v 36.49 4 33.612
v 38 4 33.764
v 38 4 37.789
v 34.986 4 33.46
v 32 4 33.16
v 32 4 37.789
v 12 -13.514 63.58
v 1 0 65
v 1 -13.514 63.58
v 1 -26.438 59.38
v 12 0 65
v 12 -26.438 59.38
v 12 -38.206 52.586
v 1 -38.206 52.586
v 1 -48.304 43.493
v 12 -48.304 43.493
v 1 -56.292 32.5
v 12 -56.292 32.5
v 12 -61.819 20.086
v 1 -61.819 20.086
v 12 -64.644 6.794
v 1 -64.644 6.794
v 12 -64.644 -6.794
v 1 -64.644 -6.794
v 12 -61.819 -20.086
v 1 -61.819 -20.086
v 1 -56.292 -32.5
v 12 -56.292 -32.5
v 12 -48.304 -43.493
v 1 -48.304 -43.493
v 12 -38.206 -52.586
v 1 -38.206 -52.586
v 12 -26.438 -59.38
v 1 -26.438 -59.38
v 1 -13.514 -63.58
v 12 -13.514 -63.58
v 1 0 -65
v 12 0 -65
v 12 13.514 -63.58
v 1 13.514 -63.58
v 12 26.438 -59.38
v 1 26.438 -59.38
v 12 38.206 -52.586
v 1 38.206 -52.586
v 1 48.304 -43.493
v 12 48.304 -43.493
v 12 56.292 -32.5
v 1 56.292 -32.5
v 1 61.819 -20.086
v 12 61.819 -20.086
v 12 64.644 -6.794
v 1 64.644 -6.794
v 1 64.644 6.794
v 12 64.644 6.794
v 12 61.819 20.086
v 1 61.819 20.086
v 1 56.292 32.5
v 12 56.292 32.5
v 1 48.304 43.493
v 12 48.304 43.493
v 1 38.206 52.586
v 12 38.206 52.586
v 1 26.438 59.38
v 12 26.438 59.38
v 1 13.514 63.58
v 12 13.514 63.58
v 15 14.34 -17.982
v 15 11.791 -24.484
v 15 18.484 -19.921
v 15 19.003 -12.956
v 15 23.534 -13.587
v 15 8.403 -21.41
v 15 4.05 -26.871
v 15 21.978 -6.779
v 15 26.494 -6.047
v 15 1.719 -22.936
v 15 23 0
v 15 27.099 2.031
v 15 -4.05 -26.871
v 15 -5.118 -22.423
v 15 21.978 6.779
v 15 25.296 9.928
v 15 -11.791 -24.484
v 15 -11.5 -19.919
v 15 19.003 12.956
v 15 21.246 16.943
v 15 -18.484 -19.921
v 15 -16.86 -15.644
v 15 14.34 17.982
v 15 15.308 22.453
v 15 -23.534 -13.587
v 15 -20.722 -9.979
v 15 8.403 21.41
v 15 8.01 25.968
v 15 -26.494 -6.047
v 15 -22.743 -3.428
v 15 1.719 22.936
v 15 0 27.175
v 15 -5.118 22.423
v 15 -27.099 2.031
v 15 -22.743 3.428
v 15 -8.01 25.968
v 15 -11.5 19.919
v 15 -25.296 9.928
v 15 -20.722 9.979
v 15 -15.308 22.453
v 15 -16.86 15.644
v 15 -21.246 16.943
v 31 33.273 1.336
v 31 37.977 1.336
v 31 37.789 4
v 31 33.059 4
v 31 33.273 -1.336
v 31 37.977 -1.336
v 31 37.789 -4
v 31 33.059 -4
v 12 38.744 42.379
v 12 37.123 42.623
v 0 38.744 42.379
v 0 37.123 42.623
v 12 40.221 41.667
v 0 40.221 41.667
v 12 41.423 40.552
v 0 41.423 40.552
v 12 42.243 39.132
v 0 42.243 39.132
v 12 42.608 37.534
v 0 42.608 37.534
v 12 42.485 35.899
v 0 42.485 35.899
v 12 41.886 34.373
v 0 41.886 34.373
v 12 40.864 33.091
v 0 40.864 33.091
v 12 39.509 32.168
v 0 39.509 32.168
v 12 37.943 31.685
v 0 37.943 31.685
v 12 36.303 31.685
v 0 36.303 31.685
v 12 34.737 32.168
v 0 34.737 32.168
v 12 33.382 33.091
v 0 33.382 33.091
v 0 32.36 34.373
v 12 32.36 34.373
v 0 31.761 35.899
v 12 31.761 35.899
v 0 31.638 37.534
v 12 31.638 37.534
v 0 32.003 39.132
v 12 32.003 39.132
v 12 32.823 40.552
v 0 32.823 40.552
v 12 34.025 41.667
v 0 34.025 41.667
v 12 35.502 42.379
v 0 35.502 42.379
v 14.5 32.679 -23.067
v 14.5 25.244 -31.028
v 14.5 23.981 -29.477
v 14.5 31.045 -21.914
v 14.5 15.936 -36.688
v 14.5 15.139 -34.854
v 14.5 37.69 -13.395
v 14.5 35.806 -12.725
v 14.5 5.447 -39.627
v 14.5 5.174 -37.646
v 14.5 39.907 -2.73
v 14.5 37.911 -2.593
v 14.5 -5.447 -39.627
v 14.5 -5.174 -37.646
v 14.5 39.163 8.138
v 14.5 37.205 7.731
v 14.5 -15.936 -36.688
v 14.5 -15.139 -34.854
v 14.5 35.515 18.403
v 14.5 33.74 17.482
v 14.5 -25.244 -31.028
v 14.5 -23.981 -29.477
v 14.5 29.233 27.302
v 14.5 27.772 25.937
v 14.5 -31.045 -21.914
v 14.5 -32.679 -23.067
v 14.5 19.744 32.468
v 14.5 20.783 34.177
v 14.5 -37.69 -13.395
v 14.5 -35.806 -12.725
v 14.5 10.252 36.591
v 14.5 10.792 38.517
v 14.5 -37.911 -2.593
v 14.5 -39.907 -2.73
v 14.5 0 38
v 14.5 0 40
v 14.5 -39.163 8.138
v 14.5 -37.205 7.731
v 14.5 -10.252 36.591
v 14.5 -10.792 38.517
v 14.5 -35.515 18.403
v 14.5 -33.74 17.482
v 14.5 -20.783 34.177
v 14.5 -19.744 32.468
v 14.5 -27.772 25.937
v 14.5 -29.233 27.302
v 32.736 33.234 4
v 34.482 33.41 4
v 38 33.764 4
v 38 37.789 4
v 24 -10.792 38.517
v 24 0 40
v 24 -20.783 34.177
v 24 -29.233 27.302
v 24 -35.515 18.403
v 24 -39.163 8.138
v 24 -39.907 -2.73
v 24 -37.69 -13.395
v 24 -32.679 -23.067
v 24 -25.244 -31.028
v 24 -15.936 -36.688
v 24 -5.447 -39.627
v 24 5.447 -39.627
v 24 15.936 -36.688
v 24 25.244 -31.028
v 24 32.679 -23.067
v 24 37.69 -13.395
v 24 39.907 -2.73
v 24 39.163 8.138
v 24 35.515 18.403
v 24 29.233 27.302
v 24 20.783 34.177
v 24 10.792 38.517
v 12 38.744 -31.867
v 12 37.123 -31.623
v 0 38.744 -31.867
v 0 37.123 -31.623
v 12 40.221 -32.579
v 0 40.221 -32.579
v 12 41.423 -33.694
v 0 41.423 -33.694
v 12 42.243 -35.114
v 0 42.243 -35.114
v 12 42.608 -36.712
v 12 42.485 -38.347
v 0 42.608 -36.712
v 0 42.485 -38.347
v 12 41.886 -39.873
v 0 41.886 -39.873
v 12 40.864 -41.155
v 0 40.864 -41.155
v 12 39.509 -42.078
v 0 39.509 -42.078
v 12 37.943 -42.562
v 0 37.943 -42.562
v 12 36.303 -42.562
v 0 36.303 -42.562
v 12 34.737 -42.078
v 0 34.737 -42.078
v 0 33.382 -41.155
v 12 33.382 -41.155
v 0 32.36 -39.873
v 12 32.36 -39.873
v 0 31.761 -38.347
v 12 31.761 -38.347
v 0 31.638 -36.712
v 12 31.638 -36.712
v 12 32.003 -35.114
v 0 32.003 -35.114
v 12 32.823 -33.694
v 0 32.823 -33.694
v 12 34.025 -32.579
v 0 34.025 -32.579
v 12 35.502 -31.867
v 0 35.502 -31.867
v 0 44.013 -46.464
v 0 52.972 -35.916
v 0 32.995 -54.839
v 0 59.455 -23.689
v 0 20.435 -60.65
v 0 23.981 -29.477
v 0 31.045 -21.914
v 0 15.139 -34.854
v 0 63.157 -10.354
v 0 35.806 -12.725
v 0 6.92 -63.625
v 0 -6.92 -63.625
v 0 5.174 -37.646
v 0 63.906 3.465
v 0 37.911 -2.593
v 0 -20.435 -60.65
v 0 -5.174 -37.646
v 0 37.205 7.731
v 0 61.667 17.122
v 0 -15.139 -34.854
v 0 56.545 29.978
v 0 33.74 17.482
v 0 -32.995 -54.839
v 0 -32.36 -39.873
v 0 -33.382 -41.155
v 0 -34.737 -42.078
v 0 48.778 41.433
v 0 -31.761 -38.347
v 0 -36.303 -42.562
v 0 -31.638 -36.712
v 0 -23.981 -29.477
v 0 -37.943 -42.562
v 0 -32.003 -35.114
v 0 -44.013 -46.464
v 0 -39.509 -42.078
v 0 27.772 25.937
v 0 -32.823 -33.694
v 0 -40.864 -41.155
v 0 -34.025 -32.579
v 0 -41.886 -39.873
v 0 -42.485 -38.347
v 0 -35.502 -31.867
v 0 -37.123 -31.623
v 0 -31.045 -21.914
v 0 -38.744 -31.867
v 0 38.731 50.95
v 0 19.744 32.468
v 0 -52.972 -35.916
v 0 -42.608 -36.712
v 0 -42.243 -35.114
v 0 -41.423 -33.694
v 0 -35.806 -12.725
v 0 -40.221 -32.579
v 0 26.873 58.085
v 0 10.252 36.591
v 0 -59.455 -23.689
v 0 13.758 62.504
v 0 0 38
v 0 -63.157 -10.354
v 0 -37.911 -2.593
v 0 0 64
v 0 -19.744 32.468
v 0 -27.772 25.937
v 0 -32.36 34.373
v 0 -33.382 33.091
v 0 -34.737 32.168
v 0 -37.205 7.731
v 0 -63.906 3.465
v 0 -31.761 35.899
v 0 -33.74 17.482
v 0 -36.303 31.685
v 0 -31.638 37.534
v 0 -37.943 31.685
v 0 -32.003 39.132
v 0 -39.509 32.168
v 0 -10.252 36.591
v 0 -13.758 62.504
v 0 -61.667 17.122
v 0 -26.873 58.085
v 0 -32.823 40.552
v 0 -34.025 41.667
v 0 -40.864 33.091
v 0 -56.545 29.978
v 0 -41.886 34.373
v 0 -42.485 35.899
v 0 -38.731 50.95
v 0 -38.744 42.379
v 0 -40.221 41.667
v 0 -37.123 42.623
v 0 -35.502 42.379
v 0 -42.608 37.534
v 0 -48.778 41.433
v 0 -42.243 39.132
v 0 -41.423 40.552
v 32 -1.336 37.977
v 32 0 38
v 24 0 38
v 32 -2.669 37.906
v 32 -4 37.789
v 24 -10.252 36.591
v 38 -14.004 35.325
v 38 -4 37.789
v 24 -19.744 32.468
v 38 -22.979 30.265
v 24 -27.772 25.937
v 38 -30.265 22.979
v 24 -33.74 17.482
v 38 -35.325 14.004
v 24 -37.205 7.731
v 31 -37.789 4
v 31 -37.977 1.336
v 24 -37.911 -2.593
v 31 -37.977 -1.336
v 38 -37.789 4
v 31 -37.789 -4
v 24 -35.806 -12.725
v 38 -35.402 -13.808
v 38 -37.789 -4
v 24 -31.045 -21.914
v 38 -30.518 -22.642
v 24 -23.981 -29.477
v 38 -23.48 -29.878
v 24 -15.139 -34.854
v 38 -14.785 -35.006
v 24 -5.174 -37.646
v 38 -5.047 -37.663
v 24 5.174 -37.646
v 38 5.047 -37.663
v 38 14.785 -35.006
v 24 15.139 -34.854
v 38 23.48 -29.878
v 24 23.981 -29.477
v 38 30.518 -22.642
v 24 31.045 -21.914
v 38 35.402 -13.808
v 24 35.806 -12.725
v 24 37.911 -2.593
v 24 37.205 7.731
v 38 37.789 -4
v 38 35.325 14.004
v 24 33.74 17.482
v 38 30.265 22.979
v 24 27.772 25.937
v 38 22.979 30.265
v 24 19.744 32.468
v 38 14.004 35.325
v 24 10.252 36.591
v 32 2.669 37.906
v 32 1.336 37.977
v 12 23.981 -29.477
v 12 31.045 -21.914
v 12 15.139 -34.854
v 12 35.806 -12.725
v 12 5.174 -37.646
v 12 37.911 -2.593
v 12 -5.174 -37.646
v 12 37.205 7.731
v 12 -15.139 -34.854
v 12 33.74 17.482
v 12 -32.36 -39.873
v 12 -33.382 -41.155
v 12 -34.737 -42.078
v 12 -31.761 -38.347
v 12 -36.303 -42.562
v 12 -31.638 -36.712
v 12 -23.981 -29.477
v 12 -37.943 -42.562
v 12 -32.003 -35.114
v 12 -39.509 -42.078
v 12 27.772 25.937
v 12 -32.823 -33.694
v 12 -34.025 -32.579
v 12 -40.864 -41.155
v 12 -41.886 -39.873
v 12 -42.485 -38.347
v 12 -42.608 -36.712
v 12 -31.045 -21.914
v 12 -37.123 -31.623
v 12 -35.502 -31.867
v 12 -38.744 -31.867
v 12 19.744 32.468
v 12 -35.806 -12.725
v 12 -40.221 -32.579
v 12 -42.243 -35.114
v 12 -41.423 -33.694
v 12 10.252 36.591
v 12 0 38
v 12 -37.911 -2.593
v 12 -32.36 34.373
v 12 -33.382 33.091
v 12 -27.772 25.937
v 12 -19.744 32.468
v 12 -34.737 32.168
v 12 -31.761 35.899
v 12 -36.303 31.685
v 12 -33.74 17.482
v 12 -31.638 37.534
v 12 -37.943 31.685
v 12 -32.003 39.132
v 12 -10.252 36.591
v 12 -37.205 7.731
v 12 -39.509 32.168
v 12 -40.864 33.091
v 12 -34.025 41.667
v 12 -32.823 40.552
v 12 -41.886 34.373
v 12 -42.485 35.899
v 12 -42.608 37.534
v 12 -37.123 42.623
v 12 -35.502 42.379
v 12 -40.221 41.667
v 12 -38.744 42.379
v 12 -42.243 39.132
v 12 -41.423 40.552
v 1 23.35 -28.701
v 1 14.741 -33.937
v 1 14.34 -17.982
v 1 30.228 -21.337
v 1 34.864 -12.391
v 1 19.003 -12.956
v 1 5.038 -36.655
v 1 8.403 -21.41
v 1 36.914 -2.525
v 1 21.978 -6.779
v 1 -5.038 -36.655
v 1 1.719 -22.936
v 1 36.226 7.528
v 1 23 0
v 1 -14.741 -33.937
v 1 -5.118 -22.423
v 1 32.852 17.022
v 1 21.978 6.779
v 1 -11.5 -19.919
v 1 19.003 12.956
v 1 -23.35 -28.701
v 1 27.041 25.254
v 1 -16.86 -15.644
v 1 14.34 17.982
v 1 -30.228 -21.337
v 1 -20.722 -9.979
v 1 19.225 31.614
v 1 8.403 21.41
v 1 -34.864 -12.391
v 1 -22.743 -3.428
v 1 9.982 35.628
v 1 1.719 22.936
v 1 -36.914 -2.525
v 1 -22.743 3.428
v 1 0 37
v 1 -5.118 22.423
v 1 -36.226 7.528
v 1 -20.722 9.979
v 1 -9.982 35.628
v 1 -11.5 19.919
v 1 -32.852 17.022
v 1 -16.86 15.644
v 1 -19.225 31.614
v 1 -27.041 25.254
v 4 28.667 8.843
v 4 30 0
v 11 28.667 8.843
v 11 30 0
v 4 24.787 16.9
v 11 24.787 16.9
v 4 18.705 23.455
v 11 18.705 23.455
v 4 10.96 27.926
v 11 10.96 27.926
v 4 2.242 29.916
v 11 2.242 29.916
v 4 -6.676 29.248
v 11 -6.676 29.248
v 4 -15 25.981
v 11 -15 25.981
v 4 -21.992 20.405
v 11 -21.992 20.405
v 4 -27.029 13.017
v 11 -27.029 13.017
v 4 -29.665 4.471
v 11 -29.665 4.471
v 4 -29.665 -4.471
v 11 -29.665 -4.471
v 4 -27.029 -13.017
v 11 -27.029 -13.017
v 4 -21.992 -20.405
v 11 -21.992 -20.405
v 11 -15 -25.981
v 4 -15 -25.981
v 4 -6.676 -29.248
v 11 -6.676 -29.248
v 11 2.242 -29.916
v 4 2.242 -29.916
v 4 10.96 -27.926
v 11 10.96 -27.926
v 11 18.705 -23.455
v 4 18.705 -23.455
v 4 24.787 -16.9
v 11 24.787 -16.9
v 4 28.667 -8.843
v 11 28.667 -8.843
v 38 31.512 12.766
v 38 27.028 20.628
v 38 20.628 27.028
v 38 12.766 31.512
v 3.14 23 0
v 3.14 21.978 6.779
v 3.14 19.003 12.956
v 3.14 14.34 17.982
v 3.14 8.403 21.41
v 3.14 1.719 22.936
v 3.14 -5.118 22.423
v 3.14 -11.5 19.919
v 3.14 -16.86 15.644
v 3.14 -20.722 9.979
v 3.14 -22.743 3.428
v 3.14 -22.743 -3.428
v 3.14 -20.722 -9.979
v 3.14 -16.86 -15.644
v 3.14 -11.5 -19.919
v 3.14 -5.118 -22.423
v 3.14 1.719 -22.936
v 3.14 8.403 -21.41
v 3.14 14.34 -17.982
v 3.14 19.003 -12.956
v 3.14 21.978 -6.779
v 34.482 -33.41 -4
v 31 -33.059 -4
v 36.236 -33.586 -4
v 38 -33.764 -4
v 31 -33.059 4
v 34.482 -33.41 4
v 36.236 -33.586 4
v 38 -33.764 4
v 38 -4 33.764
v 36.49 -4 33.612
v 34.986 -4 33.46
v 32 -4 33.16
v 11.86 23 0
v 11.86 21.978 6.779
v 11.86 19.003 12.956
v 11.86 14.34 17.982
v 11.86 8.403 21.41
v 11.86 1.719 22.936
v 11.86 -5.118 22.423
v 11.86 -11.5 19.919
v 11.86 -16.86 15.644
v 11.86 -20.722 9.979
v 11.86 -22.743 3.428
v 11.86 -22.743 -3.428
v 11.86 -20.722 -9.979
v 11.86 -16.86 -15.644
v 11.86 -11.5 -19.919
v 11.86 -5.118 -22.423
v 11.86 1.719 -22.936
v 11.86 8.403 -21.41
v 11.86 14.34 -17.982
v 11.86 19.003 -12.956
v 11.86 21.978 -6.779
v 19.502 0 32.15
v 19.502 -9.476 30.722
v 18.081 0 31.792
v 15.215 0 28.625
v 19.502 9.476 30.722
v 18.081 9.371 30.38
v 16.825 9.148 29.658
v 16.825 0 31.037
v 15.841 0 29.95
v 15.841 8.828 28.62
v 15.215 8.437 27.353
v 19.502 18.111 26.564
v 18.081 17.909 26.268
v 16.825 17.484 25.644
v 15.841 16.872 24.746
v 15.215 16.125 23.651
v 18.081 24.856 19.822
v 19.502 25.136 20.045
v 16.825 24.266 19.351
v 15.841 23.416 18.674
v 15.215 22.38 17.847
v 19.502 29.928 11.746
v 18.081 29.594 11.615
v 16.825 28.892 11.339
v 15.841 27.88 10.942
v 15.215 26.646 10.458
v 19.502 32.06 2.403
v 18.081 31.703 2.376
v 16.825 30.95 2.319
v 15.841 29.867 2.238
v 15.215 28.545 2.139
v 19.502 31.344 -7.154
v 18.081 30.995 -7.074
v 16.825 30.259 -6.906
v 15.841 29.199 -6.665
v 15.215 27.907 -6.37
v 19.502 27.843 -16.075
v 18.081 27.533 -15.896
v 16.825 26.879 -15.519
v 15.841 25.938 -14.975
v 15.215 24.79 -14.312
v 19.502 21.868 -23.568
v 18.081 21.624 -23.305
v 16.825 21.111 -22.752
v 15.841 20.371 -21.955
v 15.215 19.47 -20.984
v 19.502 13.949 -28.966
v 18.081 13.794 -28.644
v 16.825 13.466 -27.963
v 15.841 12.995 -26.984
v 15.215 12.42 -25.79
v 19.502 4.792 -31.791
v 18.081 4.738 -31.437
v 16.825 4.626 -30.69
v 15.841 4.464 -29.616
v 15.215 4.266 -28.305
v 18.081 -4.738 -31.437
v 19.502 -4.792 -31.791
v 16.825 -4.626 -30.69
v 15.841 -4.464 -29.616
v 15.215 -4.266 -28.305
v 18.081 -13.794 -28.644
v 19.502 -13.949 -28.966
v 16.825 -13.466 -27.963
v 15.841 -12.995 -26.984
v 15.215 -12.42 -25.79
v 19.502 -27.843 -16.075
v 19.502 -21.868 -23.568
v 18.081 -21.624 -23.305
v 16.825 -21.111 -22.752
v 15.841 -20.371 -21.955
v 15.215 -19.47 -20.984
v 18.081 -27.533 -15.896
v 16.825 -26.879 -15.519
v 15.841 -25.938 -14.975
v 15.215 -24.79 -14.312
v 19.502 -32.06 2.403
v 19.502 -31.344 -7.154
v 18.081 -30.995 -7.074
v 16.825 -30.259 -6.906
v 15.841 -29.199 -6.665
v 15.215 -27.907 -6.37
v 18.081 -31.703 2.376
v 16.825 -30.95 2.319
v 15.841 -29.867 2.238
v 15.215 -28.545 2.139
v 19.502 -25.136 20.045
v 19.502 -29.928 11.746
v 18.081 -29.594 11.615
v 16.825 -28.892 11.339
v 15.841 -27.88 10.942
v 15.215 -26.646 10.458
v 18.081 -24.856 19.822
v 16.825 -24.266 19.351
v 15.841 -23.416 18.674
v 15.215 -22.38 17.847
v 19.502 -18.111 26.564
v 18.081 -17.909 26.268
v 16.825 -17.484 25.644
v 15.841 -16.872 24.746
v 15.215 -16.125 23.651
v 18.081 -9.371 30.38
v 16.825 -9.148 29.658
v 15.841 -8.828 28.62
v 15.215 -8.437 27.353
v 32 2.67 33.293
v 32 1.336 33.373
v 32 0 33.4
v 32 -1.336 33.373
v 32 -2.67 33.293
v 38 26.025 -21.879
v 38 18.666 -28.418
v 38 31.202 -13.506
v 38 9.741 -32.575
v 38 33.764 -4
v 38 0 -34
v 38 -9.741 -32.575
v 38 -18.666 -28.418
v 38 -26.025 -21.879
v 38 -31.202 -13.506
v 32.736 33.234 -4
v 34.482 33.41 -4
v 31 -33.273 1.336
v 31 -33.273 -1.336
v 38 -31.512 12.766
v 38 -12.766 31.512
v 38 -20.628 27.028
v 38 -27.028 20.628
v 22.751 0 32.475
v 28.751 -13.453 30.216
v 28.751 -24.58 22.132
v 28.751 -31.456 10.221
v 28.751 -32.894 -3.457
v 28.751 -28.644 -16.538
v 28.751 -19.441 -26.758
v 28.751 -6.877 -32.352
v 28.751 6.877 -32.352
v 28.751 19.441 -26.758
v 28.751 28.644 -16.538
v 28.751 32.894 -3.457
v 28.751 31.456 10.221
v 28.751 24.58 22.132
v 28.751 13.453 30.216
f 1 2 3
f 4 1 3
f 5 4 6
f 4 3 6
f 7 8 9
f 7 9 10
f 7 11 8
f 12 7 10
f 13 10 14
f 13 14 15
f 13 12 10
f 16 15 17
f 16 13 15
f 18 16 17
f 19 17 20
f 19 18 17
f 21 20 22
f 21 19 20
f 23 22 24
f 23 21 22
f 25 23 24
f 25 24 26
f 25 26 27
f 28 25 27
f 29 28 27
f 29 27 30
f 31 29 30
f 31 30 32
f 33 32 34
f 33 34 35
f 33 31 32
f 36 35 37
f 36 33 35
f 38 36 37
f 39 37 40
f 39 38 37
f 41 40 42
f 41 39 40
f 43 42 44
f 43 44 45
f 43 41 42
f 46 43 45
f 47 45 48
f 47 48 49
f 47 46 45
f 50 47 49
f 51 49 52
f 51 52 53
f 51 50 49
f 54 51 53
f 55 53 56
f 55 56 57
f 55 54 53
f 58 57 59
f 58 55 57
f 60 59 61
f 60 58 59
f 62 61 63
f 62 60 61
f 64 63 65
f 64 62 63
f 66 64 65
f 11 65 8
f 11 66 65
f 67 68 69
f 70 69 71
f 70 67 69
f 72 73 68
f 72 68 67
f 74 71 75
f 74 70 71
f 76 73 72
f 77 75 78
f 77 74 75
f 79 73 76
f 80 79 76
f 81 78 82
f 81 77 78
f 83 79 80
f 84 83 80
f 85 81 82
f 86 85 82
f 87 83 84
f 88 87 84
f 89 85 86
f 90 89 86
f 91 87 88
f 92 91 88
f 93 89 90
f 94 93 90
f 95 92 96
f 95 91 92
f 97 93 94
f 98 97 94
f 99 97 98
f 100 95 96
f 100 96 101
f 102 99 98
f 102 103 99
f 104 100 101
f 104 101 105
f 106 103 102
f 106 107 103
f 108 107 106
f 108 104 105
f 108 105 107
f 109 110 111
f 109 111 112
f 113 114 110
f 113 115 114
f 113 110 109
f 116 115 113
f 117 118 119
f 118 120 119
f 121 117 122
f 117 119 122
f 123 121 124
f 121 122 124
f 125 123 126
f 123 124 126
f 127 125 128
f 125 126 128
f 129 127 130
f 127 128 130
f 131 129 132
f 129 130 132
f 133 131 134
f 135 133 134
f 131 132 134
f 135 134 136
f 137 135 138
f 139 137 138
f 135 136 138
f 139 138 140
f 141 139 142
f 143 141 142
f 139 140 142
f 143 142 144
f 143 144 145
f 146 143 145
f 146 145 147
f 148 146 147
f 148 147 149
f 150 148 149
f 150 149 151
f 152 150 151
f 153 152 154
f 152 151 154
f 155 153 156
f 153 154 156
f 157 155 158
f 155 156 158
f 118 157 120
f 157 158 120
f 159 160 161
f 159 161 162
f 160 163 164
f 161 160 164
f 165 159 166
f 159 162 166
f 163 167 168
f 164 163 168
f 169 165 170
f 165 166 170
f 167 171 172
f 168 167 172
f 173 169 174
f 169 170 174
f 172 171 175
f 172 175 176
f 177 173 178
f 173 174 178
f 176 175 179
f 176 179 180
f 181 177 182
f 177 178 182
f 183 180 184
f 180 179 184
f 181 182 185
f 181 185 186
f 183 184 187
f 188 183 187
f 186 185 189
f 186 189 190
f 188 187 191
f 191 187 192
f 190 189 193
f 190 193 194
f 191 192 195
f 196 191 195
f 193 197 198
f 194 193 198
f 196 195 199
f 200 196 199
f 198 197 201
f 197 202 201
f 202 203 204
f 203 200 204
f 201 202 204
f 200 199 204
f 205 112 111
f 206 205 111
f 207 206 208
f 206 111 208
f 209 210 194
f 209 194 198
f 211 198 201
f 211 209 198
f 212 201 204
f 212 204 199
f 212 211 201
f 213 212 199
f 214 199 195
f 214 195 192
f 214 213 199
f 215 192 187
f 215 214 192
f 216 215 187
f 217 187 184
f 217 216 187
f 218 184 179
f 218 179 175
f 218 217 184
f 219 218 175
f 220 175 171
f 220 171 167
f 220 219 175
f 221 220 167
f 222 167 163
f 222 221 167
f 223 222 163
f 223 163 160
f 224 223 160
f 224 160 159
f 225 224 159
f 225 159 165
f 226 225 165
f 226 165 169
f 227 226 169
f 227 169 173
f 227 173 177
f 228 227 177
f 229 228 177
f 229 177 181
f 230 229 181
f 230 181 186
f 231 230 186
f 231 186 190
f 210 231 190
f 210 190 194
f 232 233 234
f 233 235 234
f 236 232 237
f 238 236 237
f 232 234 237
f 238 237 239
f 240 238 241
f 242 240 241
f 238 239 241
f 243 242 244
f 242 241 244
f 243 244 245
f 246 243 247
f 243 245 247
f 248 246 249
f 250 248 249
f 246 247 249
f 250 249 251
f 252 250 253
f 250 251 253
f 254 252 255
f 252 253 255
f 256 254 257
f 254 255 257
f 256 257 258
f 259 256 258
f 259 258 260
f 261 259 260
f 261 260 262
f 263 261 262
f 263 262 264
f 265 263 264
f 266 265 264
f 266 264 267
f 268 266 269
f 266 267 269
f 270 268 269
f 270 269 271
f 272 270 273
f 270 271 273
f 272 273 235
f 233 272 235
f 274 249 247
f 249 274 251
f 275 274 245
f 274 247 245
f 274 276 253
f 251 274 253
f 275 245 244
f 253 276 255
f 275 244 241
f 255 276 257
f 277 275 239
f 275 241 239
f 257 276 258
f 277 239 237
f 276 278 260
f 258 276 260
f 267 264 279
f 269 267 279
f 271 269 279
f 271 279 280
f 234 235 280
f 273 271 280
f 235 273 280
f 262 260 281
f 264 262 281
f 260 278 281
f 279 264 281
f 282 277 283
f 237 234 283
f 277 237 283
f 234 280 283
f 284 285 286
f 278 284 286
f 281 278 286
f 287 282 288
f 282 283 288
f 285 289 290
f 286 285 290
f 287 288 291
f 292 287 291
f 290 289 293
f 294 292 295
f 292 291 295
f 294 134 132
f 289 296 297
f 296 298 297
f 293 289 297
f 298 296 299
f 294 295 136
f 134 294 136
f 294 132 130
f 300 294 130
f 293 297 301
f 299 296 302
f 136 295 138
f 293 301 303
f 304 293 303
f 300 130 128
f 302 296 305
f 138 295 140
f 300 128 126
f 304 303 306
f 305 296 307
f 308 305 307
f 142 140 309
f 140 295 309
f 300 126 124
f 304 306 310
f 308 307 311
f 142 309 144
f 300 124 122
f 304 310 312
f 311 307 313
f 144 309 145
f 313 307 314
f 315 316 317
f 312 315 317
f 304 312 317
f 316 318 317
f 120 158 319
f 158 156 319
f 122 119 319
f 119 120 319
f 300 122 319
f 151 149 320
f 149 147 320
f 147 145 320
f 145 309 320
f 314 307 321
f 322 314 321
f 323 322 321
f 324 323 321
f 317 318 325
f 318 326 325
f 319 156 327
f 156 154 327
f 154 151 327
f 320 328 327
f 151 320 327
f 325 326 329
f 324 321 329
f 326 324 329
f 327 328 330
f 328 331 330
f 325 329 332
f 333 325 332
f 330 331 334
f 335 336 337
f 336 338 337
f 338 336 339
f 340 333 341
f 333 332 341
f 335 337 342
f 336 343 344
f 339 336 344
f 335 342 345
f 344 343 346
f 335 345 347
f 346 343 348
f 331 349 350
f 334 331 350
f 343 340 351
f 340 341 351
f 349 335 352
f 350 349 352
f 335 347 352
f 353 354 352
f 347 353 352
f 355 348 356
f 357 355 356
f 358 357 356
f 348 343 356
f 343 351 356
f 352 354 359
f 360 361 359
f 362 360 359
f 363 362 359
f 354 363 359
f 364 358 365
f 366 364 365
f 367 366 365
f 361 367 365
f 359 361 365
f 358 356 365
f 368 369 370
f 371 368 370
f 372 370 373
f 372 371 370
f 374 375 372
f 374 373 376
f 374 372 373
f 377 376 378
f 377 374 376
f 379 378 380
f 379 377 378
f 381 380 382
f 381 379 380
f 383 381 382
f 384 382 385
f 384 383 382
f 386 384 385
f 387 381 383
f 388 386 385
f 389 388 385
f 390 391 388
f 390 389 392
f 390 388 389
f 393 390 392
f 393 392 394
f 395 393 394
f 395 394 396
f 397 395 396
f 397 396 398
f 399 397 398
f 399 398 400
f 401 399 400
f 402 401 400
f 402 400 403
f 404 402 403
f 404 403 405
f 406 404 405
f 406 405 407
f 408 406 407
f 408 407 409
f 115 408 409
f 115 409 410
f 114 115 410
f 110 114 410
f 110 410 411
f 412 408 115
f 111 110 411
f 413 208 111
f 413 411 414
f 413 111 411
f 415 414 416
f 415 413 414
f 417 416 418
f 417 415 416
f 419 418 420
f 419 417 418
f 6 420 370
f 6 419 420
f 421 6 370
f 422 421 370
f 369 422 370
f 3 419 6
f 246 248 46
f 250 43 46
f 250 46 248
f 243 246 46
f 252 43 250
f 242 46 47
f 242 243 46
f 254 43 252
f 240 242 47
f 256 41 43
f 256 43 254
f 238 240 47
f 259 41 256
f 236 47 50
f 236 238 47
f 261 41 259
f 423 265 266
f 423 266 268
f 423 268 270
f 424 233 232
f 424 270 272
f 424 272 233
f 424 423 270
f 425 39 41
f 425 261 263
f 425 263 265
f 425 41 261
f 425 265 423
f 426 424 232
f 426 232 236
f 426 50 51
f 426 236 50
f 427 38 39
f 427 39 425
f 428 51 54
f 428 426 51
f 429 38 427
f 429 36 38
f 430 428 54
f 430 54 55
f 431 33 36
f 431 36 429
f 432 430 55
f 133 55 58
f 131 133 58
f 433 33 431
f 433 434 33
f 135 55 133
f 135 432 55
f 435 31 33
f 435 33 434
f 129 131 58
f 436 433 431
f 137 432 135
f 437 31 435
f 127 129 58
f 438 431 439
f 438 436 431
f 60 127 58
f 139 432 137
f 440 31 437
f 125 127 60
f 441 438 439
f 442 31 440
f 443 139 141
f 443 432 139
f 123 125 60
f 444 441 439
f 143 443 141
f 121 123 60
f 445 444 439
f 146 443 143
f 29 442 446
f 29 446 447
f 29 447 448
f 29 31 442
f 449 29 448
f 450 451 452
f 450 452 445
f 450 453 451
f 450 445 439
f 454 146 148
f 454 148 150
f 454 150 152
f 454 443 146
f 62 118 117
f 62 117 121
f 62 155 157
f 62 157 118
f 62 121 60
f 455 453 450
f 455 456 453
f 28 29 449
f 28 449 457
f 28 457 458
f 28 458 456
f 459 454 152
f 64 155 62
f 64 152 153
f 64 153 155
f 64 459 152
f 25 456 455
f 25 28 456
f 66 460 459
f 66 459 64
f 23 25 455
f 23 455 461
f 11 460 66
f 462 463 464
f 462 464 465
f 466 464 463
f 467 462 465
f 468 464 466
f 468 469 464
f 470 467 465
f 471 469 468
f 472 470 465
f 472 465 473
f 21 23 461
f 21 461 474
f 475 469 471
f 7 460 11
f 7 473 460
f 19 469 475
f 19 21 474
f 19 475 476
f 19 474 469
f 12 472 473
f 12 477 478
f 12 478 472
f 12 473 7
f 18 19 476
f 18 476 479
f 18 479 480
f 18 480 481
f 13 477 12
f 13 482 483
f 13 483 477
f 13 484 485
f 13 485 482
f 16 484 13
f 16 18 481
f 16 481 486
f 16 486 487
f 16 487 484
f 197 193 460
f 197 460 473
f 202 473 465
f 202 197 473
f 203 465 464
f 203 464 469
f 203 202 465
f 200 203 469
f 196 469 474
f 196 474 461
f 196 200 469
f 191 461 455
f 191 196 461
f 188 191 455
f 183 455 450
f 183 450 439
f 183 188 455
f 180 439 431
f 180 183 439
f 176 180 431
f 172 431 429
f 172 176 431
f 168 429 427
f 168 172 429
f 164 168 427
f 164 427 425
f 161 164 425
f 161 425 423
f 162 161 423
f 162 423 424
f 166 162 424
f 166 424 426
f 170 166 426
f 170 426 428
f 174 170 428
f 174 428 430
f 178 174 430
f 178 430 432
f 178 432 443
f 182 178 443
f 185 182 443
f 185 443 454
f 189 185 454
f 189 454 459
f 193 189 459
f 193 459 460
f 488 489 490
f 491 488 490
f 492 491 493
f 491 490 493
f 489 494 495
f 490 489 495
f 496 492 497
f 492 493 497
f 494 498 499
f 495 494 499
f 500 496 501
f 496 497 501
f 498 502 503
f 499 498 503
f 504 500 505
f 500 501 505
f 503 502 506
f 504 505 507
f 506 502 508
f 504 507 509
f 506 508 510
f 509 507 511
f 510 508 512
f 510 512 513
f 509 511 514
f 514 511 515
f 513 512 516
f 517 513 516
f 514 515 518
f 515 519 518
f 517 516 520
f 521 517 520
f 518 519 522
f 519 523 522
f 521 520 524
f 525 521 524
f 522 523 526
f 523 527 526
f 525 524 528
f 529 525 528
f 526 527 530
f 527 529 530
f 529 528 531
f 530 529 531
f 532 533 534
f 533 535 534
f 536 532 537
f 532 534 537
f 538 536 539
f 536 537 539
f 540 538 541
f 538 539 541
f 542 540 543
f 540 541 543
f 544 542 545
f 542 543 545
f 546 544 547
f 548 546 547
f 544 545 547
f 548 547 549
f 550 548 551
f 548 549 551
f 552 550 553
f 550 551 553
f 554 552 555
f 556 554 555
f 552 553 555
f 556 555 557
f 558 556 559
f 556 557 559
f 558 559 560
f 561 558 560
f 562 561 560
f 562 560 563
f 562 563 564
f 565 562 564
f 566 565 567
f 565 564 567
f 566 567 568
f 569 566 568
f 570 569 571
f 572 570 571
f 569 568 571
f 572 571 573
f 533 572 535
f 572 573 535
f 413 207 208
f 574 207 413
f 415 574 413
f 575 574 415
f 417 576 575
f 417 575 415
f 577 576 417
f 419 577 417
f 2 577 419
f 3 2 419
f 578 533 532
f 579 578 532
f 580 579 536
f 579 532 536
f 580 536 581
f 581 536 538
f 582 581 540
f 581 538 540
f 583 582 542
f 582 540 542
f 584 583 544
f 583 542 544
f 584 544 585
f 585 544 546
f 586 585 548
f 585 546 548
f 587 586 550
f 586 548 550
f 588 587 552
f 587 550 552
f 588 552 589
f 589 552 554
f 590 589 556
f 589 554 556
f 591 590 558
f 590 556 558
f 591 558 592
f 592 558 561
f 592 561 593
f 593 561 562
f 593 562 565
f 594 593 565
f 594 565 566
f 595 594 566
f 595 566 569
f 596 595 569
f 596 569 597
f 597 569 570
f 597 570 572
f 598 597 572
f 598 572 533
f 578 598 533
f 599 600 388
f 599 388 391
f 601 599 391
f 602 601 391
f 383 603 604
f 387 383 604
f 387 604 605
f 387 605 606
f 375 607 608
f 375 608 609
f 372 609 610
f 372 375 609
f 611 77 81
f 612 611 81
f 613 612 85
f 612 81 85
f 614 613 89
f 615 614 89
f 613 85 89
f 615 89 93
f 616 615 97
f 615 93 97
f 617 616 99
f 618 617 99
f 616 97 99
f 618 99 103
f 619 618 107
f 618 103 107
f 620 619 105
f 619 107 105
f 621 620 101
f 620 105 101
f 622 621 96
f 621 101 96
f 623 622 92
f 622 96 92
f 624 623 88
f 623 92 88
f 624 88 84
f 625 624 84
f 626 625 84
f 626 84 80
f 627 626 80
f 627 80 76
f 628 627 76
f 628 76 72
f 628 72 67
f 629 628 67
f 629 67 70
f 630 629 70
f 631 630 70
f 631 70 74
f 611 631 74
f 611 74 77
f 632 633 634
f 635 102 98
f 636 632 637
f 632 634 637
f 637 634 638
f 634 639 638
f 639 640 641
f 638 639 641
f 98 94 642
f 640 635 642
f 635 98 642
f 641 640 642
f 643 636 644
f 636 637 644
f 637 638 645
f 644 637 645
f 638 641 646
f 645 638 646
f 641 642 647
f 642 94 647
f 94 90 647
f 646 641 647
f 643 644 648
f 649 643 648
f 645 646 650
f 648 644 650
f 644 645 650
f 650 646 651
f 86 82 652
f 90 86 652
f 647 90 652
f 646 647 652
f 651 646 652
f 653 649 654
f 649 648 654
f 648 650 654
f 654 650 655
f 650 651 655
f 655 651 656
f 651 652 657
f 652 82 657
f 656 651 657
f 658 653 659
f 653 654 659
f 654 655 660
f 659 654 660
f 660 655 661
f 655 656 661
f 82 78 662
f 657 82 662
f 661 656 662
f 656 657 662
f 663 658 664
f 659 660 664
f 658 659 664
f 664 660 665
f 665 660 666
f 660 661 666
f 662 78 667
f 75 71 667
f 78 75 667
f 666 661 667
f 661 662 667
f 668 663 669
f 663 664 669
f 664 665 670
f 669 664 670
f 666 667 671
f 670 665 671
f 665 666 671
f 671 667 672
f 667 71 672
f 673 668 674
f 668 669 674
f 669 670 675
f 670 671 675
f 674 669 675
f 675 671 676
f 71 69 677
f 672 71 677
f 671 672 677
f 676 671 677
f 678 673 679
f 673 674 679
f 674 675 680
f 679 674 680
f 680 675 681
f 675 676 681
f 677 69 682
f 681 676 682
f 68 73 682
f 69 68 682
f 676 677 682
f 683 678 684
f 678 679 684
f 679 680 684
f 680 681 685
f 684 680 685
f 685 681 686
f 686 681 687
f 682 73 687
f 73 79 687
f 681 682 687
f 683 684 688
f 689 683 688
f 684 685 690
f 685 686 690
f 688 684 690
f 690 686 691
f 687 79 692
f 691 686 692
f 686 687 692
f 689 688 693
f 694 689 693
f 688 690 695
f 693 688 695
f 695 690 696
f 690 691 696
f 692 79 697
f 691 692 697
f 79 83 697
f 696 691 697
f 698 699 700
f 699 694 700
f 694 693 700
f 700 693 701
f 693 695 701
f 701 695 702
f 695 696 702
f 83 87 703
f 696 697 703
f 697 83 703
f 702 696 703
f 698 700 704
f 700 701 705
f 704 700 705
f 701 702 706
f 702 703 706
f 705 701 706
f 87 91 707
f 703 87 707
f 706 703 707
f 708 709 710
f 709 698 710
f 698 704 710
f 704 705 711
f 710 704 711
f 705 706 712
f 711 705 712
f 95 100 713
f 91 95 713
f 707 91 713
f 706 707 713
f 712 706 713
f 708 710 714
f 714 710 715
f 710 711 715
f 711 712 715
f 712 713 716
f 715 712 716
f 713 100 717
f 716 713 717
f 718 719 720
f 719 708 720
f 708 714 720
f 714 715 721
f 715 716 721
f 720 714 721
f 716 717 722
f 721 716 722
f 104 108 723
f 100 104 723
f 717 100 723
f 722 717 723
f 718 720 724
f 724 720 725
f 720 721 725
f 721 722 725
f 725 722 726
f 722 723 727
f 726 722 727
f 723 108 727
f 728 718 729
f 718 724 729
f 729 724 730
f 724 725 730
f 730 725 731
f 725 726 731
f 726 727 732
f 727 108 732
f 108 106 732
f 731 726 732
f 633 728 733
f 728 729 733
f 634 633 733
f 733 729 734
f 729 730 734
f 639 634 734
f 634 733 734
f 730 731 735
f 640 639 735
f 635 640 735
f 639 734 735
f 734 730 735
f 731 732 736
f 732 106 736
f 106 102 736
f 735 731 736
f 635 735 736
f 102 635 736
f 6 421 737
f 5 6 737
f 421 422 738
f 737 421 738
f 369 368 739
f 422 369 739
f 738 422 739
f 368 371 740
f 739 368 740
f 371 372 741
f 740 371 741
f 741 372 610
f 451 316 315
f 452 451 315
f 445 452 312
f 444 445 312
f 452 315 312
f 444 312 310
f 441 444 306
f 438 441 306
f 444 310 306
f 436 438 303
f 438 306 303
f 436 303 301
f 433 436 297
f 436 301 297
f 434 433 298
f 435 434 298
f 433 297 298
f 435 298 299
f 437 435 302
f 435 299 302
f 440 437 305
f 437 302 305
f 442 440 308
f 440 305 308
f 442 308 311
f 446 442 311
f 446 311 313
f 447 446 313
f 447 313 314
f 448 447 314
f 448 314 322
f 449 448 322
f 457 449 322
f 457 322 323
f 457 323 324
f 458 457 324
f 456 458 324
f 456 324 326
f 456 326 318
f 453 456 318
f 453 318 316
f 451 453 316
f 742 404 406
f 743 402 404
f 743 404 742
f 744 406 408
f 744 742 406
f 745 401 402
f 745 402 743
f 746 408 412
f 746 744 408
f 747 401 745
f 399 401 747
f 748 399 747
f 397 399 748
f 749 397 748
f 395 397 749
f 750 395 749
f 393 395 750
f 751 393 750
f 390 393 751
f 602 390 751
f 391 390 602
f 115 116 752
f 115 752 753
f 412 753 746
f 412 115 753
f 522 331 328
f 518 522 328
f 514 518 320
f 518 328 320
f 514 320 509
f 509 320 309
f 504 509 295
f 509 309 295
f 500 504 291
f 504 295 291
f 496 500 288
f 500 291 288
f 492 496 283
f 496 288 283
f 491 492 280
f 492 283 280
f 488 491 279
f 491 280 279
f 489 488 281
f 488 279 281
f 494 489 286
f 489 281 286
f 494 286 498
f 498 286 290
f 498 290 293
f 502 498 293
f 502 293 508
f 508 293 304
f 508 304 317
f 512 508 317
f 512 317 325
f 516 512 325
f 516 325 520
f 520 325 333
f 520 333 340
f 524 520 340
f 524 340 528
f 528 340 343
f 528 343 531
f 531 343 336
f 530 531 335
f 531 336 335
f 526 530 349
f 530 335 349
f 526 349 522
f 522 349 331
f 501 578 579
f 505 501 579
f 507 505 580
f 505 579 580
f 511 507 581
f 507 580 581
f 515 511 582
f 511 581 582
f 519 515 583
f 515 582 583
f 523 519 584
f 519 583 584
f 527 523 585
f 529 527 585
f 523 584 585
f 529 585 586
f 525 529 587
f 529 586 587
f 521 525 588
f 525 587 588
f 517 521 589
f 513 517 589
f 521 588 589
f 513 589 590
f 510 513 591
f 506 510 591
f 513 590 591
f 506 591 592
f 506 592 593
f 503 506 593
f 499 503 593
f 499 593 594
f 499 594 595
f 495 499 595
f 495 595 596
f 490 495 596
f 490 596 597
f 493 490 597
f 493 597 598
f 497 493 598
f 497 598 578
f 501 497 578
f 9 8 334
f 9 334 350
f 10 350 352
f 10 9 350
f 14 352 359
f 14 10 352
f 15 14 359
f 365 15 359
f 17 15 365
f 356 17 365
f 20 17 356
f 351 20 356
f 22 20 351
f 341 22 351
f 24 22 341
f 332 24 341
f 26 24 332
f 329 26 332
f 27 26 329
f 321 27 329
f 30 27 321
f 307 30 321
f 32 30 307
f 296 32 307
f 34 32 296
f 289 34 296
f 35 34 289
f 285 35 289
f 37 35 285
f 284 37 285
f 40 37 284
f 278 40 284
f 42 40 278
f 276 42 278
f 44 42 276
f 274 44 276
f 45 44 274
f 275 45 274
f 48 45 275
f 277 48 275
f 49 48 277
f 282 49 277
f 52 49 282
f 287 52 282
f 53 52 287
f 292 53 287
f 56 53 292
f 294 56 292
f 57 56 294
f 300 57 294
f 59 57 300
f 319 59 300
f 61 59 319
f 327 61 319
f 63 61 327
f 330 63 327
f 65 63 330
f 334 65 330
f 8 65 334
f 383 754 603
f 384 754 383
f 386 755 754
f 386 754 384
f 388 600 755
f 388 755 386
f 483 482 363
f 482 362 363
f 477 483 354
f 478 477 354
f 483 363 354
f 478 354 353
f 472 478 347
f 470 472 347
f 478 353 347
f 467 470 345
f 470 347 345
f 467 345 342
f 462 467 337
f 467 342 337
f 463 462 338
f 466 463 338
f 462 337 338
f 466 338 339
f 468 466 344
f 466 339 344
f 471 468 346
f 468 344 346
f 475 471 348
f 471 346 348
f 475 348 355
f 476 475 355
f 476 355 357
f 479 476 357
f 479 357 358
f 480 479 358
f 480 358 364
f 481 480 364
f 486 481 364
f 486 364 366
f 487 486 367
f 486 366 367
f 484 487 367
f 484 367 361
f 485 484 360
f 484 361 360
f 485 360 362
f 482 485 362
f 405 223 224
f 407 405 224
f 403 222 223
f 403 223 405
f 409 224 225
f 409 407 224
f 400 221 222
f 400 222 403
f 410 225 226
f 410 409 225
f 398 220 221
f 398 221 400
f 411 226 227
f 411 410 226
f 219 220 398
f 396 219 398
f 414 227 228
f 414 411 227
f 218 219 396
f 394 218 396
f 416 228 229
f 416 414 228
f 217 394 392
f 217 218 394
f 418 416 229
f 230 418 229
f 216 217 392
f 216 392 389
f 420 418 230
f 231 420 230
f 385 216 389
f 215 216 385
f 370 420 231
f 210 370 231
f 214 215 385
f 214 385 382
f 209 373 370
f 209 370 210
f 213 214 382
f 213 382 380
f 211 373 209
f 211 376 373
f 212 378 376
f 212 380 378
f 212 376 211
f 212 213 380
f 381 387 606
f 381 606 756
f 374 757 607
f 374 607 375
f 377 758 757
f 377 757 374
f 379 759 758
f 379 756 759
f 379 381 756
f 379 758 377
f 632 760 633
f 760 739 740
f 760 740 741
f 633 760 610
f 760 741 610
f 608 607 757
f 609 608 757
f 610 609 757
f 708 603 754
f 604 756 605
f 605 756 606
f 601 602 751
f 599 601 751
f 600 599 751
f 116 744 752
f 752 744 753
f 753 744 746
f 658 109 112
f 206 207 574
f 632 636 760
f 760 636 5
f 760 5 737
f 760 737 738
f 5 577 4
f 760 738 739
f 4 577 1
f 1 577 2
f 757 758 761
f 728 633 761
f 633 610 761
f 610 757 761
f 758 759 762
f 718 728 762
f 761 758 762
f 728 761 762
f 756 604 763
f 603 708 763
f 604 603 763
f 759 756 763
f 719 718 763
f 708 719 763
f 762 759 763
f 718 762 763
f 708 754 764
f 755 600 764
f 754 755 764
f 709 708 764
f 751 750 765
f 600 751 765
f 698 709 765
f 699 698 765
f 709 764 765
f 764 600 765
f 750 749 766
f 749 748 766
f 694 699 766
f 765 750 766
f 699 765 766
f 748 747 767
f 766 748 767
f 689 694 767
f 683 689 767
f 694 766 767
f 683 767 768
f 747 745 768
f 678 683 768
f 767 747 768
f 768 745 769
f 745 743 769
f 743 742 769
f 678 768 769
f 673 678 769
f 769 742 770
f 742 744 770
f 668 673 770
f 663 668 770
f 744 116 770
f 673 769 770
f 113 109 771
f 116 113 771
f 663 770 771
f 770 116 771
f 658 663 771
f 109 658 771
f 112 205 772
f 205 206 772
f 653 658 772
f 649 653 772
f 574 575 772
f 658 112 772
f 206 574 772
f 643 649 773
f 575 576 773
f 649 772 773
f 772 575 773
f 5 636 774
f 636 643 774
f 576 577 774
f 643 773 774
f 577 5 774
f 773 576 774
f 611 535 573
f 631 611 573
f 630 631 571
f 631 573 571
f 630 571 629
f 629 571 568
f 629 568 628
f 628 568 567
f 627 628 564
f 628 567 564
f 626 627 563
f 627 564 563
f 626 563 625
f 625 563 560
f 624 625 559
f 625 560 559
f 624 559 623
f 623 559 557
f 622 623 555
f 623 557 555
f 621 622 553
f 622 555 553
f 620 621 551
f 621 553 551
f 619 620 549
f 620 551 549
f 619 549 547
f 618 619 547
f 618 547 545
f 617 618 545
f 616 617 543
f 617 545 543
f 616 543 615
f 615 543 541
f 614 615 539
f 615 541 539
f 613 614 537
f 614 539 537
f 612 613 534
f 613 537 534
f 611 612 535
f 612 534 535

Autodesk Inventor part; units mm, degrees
ref_plane "YZ Plane" through (0, 0, 0) normal (1, 0, 0) x (0, 1, 0)
ref_plane "XZ Plane" through (0, 0, 0) normal (0, 1, 0) x (-1, 0, 0)
ref_plane "XY Plane" through (0, 0, 0) normal (0, 0, 1) x (1, 0, 0)
sketch "草图1" plane through (0, 0, 0) normal (0, 1, 0) x (-1, 0, 0)
  line L0 (0, 65) -> (-12, 65)
  line L1 (-12, 65) -> (-12, 38)
  line L2 (-12, 38) -> (-14.5, 38)
  line L3 (-14.5, 38) -> (-14.5, 40)
  line L4 (-14.5, 40) -> (-24, 40)
  line L5 (-24, 40) -> (-24, 38)
  line L6 (-24, 38) -> (-38, 38)
  line L7 (-38, 38) -> (-38, 0)
  line L8 (-38, 0) -> (0, 0)
  line L9 (0, 0) -> (0, 65)
  line L10 (0, 38) -> (-1, 37)
  line L11 (-1, 37) -> (-1, 0)
  line L12 (-38, 34) -> (-15, 31.6998)
  line L13 (-15, 31.6998) -> (-15, 0)
  line L14 (7.6, 0) -> (-45.6, 0) projected
  dimension "d2" = 65
  dimension "d4" = 26
  dimension "d5" = 12
  dimension "d6" = 40
  dimension "d7" = 38
  dimension "d8" = 12
  dimension "d9" = 2.5
  dimension "d10" = 38
  dimension "d11" = 45
  dimension "d12" = 1
  dimension "d13" = 15
  dimension "d14" = 34
  dimension "d15" = 84.289
revolve "旋转1" add sketch "草图1" angle 360 about axis through (-10, 0, 0) along (1, 0, 0) contours L9 L10 L11 L8 L13 L12 L7 L6 L5 L4 L3 L2 L1 L0
sketch "草图2" plane through (0, 0, 0) normal (0, 1, 0) x (-1, 0, 0)
  line L0 (-24, 38) -> (-38, 38) projected
  line L1 (-39, 38) -> (-32, 38)
  line L2 (-32, 38) -> (-32, -20)
  line L3 (-32, -20) -> (-39, -20)
  line L4 (-39, -20) -> (-39, 38)
  point P0 (0, 0)
  dimension "d17" = 7
extrude "拉伸1" cut sketch "草图2" along normal mid plane 8
sketch "草图3" plane through (0, 0, 0) normal (0, 0, 1) x (1, 0, 0)
  line L0 (38, 4) -> (38, 38) projected
  line L1 (24, -38) -> (38, -38) projected
  line L2 (38, 38) -> (31, 38)
  line L3 (31, 38) -> (31, -38)
  line L4 (31, -38) -> (38, -38)
  line L5 (38, -38) -> (38, 38)
  point P0 (0, 0)
  point P1 (38, -4)
  dimension "d20" = 7
extrude "拉伸2" cut sketch "草图3" along normal mid plane 8
sketch "草图4" plane through (0, 0, 0) normal (-1, 0, 0) x (0, 0, 1)
  circle A0 centre (37.1231, 37.1231) radius 5.5
  circle A1 centre (-37.1231, 37.1231) radius 5.5
  circle A2 centre (-37.1231, -37.1231) radius 5.5
  circle A3 centre (37.1231, -37.1231) radius 5.5
  line L0 (37.1231, 37.1231) -> (0, 0)
  line L1 (0, -91) -> (0, 91) projected
  dimension "d23" = 11
  dimension "d24" = 52.5
  dimension "d27" = 360
  dimension "d42" = 45
extrude "拉伸3" cut sketch "草图4" against normal up to surface (12 mm away)
chamfer "倒角1" distance 1 angle 45 1 edges at (0, 0, -65)
fillet "圆角1" radius 5 1 edges at (15, 0, -31.6998)
sketch "草图5" plane through (0, 0, 0) normal (0, 0, 1) x (1, 0, 0)
  line L0 (0, -38) -> (0, 38) projected
  line L1 (0, 23) -> (3.1405, 23)
  line L2 (3.1405, 23) -> (4, 30)
  line L3 (4, 30) -> (11, 30)
  line L4 (11, 30) -> (11.8595, 23)
  line L5 (11.8595, 23) -> (15, 23)
  line L6 (15, 27.1749) -> (15, -27.1749) projected
  line L7 (0, 23) -> (0, 0)
  line L8 (0, 0) -> (15, 0)
  line L9 (15, 23) -> (15, 0)
  line L10 (-3, 0) -> (18, 0) projected
  point P0 (7.5, 30)
  dimension "d35" = 23
  dimension "d36" = 30
  dimension "d37" = 7
  dimension "d38" = 7
  dimension "d39" = 7
  dimension "d40" = 7.5
revolve "旋转2" cut sketch "草图5" angle 360 about axis through (-10, 0, 0) along (1, 0, 0)
equation "\"d2\" = 0.5 * D2"
equation "\"d4\" = M"
equation "\"d5\" = e"
equation "\"d6\" = 0.5 * D"
equation "\"d7\" = 0.5 * D_d"
equation "\"d8\" = e1"
equation "\"d10\" = 0.5 * D_d"
equation "\"d13\" = b1"
equation "\"d14\" = 0.5 * D4"
equation "\"d17\" = h_b"
equation "\"d18\" = b"
equation "\"d20\" = h_b"
equation "\"d21\" = b"
equation "\"d23\" = d0"
equation "\"d24\" = 0.5 * D0"
equation "\"d29\" = b"
equation "\"d35\" = 0.5 * d1"
equation "\"d36\" = 0.5 * d1_D0"
equation "\"d37\" = d1_b"
equation "\"d40\" = 0.5 * b1"
equation "\"d0\" = 11"
equation "\"D0\" = 105"
equation "\"D4\" = 68"
equation "\"D_d\" = 76"
equation "\"e\" = 12"
equation "\"e1\" = 12"
equation "\"b\" = 8"
equation "\"h_b\" = 7"
equation "\"M\" = 26"
equation "\"b1\" = 15"
equation "\"d1\" = 46"
equation "\"d1_b\" = 7"
equation "\"D2\" = 130"
equation "\"D\" = 80"
equation "\"d1_D0\" = 60"
properties part number "低速轴承透盖" material "灰口铁"
